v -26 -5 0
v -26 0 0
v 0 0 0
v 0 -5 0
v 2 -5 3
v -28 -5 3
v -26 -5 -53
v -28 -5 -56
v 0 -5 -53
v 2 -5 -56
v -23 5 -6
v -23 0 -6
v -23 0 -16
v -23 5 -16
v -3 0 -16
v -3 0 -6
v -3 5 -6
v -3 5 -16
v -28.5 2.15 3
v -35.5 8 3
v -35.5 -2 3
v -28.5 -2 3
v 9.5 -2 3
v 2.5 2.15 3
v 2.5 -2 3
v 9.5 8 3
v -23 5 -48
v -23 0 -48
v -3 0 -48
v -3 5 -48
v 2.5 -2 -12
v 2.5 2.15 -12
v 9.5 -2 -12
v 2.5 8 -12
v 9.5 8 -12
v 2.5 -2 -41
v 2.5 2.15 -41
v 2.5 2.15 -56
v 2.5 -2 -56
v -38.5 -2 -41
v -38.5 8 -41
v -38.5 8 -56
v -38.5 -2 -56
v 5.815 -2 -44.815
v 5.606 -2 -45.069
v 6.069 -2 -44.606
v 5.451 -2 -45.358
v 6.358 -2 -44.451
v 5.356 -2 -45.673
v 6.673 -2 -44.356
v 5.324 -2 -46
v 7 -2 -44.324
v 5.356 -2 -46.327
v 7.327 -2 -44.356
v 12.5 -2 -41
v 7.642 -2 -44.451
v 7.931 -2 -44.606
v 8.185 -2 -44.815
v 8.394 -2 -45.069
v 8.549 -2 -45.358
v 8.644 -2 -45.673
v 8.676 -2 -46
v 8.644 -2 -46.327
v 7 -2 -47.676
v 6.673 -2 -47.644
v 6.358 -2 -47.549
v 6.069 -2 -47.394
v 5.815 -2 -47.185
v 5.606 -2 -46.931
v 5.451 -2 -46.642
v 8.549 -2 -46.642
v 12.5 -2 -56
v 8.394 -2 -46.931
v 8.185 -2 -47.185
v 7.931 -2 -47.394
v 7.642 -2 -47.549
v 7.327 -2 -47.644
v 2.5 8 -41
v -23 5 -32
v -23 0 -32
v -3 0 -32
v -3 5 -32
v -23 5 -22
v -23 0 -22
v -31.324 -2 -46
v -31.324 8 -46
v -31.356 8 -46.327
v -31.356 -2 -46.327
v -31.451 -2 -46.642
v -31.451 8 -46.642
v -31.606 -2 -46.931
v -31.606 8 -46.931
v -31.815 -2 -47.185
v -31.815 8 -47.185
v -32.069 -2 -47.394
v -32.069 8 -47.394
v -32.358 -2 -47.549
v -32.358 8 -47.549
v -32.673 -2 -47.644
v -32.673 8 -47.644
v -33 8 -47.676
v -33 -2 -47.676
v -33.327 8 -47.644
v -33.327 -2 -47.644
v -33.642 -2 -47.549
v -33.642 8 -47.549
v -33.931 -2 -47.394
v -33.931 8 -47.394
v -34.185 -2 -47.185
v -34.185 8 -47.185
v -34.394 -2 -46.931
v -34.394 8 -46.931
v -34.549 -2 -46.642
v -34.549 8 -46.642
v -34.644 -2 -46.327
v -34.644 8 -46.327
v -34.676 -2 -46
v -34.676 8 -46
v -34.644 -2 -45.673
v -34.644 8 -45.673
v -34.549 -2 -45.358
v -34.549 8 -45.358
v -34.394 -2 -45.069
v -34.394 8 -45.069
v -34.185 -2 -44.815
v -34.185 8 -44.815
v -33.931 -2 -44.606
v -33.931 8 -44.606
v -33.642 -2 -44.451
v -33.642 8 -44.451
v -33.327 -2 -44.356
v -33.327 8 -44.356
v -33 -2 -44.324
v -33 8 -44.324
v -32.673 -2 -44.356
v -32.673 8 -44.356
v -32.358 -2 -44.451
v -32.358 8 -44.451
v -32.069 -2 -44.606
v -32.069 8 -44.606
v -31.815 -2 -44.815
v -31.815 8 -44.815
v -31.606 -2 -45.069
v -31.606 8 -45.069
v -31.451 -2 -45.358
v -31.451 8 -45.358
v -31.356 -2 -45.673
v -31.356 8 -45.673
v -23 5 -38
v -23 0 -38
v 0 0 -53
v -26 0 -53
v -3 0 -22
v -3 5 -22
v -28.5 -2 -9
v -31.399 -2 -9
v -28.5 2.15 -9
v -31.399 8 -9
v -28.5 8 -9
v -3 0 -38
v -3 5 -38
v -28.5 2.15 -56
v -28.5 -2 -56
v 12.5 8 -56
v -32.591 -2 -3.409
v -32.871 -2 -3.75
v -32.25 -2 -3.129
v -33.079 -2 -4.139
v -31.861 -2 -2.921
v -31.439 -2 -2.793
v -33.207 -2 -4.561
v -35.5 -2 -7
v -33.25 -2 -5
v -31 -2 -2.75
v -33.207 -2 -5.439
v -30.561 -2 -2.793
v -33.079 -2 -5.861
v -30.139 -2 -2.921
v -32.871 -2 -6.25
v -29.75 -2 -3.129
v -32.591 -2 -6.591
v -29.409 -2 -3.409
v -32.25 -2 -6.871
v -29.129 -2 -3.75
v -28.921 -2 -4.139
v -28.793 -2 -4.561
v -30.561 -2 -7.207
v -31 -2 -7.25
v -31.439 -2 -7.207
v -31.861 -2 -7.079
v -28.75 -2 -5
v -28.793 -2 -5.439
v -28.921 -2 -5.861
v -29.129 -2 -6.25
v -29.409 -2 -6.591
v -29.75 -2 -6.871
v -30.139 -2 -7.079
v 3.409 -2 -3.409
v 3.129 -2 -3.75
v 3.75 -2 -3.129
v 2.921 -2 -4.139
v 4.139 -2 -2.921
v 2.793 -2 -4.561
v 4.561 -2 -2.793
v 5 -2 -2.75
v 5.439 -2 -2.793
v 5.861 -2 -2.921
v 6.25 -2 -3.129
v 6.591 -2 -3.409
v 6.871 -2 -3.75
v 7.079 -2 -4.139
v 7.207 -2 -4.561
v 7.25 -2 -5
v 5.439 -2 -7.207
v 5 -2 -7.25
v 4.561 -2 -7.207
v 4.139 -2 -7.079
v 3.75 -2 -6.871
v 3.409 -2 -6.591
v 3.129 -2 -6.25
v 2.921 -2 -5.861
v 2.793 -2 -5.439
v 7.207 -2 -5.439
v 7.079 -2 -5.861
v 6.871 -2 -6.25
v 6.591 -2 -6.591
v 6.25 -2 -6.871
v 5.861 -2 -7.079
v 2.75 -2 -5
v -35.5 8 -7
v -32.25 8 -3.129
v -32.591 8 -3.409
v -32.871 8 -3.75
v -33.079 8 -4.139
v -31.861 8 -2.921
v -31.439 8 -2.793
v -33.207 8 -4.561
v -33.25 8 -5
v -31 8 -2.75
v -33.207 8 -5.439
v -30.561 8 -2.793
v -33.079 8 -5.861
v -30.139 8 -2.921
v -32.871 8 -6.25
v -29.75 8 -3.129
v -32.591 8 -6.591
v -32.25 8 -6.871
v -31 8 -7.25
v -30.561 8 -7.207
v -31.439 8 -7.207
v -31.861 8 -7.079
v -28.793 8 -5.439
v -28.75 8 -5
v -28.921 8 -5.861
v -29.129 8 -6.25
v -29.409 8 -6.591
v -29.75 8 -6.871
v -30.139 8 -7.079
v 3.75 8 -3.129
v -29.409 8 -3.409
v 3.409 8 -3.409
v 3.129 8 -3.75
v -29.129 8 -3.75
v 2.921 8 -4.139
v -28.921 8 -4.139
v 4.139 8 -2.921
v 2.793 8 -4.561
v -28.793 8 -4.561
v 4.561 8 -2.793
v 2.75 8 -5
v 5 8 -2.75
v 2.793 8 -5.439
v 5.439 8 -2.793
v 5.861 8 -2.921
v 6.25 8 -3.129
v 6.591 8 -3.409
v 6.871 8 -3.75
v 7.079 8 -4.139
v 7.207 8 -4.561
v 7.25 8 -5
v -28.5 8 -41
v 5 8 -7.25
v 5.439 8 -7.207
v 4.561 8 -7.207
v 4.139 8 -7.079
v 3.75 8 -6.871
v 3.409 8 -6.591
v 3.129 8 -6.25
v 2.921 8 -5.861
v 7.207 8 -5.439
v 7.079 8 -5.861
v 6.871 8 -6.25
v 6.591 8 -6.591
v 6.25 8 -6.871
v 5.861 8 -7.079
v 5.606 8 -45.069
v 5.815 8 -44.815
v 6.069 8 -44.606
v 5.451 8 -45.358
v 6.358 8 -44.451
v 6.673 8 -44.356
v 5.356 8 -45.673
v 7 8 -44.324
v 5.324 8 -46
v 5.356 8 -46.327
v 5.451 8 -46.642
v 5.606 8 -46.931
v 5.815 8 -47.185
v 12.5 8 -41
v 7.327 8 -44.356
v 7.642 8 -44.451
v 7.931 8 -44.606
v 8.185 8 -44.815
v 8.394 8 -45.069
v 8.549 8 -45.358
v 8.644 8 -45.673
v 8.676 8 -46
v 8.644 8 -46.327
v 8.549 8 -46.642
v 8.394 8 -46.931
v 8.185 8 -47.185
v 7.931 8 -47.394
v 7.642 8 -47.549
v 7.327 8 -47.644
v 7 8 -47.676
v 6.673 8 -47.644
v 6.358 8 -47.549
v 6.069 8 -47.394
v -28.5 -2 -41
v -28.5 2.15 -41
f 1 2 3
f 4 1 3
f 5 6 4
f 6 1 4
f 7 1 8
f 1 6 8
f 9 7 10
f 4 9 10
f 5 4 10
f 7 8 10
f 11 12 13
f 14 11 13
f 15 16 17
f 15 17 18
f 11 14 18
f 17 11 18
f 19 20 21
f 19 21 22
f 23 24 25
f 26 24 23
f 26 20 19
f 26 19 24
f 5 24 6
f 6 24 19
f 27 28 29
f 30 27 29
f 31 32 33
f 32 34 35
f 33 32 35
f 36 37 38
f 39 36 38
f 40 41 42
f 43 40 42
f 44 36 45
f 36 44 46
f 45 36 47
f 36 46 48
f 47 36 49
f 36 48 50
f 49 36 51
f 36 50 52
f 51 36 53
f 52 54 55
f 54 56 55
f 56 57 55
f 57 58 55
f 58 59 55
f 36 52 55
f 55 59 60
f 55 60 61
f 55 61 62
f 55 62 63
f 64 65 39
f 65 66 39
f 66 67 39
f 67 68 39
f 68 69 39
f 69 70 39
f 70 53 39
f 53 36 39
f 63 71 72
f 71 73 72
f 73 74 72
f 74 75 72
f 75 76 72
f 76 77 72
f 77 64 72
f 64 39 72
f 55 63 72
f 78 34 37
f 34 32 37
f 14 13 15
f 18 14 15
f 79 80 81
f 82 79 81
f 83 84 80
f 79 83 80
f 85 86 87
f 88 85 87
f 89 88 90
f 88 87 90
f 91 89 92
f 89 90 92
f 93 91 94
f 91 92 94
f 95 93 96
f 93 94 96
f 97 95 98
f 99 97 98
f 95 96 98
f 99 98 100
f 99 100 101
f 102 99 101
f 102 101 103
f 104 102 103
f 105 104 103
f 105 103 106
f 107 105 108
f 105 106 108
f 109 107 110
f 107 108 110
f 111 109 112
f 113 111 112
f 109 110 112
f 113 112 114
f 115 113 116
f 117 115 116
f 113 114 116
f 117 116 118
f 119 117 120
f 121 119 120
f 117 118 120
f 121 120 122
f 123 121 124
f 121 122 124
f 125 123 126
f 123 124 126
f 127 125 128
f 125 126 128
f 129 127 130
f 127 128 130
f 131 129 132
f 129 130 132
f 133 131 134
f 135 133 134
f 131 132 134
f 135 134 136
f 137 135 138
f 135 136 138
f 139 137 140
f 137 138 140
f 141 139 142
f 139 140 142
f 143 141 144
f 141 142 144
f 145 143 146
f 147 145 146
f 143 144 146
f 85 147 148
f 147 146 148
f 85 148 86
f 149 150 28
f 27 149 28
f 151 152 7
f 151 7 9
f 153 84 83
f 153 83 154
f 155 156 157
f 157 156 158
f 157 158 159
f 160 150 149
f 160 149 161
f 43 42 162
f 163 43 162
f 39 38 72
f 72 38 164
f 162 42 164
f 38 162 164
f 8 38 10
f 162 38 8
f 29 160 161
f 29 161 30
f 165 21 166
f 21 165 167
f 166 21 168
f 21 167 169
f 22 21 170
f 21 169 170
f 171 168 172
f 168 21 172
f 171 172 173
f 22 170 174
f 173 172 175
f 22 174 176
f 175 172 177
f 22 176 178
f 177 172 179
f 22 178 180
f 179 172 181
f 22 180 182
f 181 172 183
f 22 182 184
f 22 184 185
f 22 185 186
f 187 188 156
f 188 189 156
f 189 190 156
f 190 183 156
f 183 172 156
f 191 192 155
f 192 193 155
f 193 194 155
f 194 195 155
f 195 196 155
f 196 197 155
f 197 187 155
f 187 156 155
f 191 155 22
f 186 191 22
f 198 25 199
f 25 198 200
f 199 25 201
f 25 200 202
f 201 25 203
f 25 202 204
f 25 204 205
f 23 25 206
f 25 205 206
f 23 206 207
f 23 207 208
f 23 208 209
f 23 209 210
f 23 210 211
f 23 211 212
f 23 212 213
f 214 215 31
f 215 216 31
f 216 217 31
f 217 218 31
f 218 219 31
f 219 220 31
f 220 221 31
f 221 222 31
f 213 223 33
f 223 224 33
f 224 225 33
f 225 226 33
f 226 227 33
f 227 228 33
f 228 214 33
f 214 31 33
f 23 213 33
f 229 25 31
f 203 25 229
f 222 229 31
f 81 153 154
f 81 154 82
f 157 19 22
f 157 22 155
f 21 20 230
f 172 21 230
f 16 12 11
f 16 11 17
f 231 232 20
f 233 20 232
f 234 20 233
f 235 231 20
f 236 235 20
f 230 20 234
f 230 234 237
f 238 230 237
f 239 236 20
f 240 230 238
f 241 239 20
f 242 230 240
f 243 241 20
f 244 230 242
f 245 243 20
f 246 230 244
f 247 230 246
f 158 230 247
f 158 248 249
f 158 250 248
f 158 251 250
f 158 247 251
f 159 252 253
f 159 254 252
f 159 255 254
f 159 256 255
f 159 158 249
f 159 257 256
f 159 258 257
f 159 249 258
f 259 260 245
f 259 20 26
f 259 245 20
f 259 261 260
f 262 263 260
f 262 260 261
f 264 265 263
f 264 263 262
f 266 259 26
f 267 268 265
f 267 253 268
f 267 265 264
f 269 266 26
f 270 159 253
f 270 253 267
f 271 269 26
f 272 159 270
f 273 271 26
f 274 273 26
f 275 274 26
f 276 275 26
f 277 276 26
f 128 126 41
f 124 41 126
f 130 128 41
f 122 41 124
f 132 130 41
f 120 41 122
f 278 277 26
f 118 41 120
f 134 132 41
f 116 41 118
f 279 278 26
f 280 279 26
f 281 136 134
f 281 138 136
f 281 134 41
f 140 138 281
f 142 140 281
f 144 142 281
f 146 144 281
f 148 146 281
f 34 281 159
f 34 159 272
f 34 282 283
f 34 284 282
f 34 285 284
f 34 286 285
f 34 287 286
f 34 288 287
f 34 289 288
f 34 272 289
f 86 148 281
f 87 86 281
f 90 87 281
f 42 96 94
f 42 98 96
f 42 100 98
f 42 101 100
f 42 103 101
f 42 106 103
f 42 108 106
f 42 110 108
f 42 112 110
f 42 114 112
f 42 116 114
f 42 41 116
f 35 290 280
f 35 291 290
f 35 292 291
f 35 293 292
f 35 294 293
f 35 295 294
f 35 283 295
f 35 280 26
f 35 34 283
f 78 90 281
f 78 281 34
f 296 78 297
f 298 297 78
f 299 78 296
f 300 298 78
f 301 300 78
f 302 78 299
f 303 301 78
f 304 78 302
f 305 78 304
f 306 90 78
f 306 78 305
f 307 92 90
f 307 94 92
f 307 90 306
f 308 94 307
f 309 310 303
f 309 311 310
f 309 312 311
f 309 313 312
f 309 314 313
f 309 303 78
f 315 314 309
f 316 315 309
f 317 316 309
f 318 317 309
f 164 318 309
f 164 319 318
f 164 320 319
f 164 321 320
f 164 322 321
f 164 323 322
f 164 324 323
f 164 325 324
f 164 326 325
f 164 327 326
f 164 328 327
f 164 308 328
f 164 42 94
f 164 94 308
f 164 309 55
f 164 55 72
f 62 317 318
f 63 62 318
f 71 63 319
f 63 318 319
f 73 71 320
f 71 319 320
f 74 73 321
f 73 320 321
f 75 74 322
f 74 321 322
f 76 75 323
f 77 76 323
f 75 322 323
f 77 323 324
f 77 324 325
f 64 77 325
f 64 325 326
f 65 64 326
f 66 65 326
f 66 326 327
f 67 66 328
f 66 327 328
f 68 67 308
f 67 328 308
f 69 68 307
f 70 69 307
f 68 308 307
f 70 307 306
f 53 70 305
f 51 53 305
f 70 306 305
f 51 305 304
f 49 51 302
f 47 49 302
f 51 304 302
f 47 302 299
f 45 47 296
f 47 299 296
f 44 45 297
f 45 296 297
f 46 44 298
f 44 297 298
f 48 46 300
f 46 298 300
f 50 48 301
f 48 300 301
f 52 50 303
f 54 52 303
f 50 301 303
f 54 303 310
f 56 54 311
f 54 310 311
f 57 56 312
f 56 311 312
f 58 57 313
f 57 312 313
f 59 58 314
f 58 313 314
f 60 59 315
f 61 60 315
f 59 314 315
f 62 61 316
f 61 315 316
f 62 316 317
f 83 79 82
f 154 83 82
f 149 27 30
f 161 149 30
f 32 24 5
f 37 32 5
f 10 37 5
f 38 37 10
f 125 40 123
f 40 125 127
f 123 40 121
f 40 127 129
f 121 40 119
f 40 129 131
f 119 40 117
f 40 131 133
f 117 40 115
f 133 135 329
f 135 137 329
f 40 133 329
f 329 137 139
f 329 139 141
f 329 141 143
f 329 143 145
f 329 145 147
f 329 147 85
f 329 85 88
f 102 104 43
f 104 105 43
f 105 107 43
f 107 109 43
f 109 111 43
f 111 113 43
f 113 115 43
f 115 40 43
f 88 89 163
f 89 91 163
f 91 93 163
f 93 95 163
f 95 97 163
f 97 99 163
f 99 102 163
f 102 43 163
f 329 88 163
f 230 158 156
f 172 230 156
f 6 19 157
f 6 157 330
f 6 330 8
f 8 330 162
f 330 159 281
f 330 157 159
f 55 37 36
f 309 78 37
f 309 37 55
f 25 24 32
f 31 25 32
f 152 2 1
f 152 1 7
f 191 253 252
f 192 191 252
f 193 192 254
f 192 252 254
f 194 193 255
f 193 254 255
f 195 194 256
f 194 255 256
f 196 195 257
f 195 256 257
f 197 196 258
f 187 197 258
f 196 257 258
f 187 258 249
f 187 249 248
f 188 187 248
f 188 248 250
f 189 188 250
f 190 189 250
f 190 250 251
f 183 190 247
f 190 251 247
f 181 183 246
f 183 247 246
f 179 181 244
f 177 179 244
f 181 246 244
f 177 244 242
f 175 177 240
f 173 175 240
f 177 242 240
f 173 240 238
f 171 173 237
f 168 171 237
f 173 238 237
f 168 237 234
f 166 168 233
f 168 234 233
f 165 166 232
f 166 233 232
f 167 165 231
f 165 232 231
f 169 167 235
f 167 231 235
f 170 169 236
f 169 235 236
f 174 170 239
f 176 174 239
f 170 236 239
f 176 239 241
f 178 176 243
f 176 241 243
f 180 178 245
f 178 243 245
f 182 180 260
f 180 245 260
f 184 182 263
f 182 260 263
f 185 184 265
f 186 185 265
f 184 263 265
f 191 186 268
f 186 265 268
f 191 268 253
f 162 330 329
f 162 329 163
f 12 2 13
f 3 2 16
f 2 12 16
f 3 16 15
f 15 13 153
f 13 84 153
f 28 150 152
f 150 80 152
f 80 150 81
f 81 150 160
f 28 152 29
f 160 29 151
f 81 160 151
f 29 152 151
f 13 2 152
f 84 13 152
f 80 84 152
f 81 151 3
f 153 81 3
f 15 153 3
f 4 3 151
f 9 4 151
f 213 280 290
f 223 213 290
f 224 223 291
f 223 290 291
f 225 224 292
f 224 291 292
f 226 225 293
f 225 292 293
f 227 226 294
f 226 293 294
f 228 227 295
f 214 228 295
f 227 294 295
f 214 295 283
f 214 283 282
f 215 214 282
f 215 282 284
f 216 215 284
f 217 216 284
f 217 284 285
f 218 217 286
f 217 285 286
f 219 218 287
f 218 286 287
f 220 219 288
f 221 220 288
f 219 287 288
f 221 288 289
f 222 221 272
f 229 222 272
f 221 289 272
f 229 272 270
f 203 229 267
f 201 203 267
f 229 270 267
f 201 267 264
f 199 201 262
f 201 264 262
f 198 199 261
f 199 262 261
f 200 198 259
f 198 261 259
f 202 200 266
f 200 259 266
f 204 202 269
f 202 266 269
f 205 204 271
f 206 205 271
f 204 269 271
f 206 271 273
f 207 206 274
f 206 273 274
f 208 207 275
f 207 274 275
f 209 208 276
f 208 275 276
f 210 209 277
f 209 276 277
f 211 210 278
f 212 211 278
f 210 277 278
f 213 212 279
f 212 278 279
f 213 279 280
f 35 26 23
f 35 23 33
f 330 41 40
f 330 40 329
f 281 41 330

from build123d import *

# Parameters (mm, degrees)
SKETCH1_W           = 26
SKETCH1_H           = 53
SKETCH1_W_2         = 20
SKETCH1_H_2         = 10
BOSS_EXTRUDE1_DEPTH = 5
SKETCH2_W           = 31
SKETCH2_H           = 59
SKETCH2_W_2         = 26
SKETCH2_H_2         = 53
BOSS_EXTRUDE2_DEPTH = 10
SKETCH3_W           = 31
SKETCH3_H           = 59
BOSS_EXTRUDE3_DEPTH = 3
CHAMFER1_SIZE       = 0.5
CHAMFER1_SIZE2      = 7.150333128
SKETCH10_W          = 7
SKETCH10_H          = 15
SKETCH10_R          = 2.25
BOSS_EXTRUDE7_DEPTH = 10
SKETCH11_W          = 7
SKETCH11_H          = 3
CUT_EXTRUDE4_DEPTH  = 10
CHAMFER2_SIZE       = 2
CHAMFER2_SIZE2      = 4.100607683
SKETCH12_W          = 10
SKETCH12_H          = 15
SKETCH12_R          = 1.676379865
BOSS_EXTRUDE8_DEPTH = 10


with BuildPart() as part:
    # Sketch1 → Boss-Extrude1 (new body)
    with BuildSketch(Plane(origin=(0, 0, 0), x_dir=(1, 0, 0), z_dir=(0, 1, 0))):
        with Locations((-13, 26.5)):
            Rectangle(SKETCH1_W, SKETCH1_H)
        with Locations((-13, 27)):
            Rectangle(SKETCH1_W_2, SKETCH1_H_2, mode=Mode.SUBTRACT)
        with Locations((-13, 43)):
            Rectangle(SKETCH1_W_2, SKETCH1_H_2, mode=Mode.SUBTRACT)
        with Locations((-13, 11)):
            Rectangle(SKETCH1_W_2, SKETCH1_H_2, mode=Mode.SUBTRACT)
    extrude(amount=BOSS_EXTRUDE1_DEPTH)

    # Sketch2 → Boss-Extrude2 (add)
    with BuildSketch(Plane(origin=(0, 5, 0), x_dir=(1, 0, 0), z_dir=(0, 1, 0))):
        with Locations((-13, 26.5)):
            Rectangle(SKETCH2_W, SKETCH2_H)
        with Locations((-13, 26.5)):
            Rectangle(SKETCH2_W_2, SKETCH2_H_2, mode=Mode.SUBTRACT)
    extrude(amount=-BOSS_EXTRUDE2_DEPTH)

    # Sketch3 → Boss-Extrude3 (add)
    with BuildSketch(Plane(origin=(0, 5, 0), x_dir=(1, 0, 0), z_dir=(0, 1, 0))):
        with Locations((-13, 26.5)):
            Rectangle(SKETCH3_W, SKETCH3_H)
    extrude(amount=BOSS_EXTRUDE3_DEPTH)

    # Chamfer1
    chamfer1_edges = [part.edges().sort_by_distance(p)[0] for p in [
        (-28.5, -5, -26.5),
        (2.5, -5, -26.5),
    ]]
    chamfer1_side = [part.faces().sort_by_distance(p)[0] for p in [
        (-13, -5, -55.333516692),
    ]]
    chamfer(chamfer1_edges, length=CHAMFER1_SIZE, length2=CHAMFER1_SIZE2, reference=chamfer1_side[0])

    # Sketch10 → Boss-Extrude7 (add)
    with BuildSketch(Plane(origin=(0, 8, 0), x_dir=(1, 0, 0), z_dir=(0, 1, 0))):
        with Locations((6, 4.5)):
            Rectangle(SKETCH10_W, SKETCH10_H)
        with Locations((5, 5)):
            Circle(SKETCH10_R, mode=Mode.SUBTRACT)
        with Locations((-32, 4.5)):
            Rectangle(SKETCH10_W, SKETCH10_H)
        with Locations((-31, 5)):
            Circle(SKETCH10_R, mode=Mode.SUBTRACT)
    extrude(amount=-BOSS_EXTRUDE7_DEPTH)

    # Sketch11 → Cut-Extrude4 (cut)
    with BuildSketch(Plane(origin=(0, 8, 0), x_dir=(1, 0, 0), z_dir=(0, 1, 0))):
        with Locations((-32, 10.5)):
            Rectangle(SKETCH11_W, SKETCH11_H)
    extrude(amount=-CUT_EXTRUDE4_DEPTH, mode=Mode.SUBTRACT)

    # Chamfer2
    chamfer2_edges = [part.edges().sort_by_distance(p)[0] for p in [
        (-35.5, 3, -9),
    ]]
    chamfer2_side = [part.faces().sort_by_distance(p)[0] for p in [
        (-35.5, 3, -3),
    ]]
    chamfer(chamfer2_edges, length=CHAMFER2_SIZE, length2=CHAMFER2_SIZE2, reference=chamfer2_side[0])

    # Sketch12 → Boss-Extrude8 (add)
    with BuildSketch(Plane(origin=(0, 8, 0), x_dir=(1, 0, 0), z_dir=(0, 1, 0))):
        with Locations((7.5, 48.5)):
            Rectangle(SKETCH12_W, SKETCH12_H)
        with Locations((7, 46)):
            Circle(SKETCH12_R, mode=Mode.SUBTRACT)
        with Locations((-33.5, 48.5)):
            Rectangle(SKETCH12_W, SKETCH12_H)
        with Locations((-33, 46)):
            Circle(SKETCH12_R, mode=Mode.SUBTRACT)
    extrude(amount=-BOSS_EXTRUDE8_DEPTH)


solid = part.part
